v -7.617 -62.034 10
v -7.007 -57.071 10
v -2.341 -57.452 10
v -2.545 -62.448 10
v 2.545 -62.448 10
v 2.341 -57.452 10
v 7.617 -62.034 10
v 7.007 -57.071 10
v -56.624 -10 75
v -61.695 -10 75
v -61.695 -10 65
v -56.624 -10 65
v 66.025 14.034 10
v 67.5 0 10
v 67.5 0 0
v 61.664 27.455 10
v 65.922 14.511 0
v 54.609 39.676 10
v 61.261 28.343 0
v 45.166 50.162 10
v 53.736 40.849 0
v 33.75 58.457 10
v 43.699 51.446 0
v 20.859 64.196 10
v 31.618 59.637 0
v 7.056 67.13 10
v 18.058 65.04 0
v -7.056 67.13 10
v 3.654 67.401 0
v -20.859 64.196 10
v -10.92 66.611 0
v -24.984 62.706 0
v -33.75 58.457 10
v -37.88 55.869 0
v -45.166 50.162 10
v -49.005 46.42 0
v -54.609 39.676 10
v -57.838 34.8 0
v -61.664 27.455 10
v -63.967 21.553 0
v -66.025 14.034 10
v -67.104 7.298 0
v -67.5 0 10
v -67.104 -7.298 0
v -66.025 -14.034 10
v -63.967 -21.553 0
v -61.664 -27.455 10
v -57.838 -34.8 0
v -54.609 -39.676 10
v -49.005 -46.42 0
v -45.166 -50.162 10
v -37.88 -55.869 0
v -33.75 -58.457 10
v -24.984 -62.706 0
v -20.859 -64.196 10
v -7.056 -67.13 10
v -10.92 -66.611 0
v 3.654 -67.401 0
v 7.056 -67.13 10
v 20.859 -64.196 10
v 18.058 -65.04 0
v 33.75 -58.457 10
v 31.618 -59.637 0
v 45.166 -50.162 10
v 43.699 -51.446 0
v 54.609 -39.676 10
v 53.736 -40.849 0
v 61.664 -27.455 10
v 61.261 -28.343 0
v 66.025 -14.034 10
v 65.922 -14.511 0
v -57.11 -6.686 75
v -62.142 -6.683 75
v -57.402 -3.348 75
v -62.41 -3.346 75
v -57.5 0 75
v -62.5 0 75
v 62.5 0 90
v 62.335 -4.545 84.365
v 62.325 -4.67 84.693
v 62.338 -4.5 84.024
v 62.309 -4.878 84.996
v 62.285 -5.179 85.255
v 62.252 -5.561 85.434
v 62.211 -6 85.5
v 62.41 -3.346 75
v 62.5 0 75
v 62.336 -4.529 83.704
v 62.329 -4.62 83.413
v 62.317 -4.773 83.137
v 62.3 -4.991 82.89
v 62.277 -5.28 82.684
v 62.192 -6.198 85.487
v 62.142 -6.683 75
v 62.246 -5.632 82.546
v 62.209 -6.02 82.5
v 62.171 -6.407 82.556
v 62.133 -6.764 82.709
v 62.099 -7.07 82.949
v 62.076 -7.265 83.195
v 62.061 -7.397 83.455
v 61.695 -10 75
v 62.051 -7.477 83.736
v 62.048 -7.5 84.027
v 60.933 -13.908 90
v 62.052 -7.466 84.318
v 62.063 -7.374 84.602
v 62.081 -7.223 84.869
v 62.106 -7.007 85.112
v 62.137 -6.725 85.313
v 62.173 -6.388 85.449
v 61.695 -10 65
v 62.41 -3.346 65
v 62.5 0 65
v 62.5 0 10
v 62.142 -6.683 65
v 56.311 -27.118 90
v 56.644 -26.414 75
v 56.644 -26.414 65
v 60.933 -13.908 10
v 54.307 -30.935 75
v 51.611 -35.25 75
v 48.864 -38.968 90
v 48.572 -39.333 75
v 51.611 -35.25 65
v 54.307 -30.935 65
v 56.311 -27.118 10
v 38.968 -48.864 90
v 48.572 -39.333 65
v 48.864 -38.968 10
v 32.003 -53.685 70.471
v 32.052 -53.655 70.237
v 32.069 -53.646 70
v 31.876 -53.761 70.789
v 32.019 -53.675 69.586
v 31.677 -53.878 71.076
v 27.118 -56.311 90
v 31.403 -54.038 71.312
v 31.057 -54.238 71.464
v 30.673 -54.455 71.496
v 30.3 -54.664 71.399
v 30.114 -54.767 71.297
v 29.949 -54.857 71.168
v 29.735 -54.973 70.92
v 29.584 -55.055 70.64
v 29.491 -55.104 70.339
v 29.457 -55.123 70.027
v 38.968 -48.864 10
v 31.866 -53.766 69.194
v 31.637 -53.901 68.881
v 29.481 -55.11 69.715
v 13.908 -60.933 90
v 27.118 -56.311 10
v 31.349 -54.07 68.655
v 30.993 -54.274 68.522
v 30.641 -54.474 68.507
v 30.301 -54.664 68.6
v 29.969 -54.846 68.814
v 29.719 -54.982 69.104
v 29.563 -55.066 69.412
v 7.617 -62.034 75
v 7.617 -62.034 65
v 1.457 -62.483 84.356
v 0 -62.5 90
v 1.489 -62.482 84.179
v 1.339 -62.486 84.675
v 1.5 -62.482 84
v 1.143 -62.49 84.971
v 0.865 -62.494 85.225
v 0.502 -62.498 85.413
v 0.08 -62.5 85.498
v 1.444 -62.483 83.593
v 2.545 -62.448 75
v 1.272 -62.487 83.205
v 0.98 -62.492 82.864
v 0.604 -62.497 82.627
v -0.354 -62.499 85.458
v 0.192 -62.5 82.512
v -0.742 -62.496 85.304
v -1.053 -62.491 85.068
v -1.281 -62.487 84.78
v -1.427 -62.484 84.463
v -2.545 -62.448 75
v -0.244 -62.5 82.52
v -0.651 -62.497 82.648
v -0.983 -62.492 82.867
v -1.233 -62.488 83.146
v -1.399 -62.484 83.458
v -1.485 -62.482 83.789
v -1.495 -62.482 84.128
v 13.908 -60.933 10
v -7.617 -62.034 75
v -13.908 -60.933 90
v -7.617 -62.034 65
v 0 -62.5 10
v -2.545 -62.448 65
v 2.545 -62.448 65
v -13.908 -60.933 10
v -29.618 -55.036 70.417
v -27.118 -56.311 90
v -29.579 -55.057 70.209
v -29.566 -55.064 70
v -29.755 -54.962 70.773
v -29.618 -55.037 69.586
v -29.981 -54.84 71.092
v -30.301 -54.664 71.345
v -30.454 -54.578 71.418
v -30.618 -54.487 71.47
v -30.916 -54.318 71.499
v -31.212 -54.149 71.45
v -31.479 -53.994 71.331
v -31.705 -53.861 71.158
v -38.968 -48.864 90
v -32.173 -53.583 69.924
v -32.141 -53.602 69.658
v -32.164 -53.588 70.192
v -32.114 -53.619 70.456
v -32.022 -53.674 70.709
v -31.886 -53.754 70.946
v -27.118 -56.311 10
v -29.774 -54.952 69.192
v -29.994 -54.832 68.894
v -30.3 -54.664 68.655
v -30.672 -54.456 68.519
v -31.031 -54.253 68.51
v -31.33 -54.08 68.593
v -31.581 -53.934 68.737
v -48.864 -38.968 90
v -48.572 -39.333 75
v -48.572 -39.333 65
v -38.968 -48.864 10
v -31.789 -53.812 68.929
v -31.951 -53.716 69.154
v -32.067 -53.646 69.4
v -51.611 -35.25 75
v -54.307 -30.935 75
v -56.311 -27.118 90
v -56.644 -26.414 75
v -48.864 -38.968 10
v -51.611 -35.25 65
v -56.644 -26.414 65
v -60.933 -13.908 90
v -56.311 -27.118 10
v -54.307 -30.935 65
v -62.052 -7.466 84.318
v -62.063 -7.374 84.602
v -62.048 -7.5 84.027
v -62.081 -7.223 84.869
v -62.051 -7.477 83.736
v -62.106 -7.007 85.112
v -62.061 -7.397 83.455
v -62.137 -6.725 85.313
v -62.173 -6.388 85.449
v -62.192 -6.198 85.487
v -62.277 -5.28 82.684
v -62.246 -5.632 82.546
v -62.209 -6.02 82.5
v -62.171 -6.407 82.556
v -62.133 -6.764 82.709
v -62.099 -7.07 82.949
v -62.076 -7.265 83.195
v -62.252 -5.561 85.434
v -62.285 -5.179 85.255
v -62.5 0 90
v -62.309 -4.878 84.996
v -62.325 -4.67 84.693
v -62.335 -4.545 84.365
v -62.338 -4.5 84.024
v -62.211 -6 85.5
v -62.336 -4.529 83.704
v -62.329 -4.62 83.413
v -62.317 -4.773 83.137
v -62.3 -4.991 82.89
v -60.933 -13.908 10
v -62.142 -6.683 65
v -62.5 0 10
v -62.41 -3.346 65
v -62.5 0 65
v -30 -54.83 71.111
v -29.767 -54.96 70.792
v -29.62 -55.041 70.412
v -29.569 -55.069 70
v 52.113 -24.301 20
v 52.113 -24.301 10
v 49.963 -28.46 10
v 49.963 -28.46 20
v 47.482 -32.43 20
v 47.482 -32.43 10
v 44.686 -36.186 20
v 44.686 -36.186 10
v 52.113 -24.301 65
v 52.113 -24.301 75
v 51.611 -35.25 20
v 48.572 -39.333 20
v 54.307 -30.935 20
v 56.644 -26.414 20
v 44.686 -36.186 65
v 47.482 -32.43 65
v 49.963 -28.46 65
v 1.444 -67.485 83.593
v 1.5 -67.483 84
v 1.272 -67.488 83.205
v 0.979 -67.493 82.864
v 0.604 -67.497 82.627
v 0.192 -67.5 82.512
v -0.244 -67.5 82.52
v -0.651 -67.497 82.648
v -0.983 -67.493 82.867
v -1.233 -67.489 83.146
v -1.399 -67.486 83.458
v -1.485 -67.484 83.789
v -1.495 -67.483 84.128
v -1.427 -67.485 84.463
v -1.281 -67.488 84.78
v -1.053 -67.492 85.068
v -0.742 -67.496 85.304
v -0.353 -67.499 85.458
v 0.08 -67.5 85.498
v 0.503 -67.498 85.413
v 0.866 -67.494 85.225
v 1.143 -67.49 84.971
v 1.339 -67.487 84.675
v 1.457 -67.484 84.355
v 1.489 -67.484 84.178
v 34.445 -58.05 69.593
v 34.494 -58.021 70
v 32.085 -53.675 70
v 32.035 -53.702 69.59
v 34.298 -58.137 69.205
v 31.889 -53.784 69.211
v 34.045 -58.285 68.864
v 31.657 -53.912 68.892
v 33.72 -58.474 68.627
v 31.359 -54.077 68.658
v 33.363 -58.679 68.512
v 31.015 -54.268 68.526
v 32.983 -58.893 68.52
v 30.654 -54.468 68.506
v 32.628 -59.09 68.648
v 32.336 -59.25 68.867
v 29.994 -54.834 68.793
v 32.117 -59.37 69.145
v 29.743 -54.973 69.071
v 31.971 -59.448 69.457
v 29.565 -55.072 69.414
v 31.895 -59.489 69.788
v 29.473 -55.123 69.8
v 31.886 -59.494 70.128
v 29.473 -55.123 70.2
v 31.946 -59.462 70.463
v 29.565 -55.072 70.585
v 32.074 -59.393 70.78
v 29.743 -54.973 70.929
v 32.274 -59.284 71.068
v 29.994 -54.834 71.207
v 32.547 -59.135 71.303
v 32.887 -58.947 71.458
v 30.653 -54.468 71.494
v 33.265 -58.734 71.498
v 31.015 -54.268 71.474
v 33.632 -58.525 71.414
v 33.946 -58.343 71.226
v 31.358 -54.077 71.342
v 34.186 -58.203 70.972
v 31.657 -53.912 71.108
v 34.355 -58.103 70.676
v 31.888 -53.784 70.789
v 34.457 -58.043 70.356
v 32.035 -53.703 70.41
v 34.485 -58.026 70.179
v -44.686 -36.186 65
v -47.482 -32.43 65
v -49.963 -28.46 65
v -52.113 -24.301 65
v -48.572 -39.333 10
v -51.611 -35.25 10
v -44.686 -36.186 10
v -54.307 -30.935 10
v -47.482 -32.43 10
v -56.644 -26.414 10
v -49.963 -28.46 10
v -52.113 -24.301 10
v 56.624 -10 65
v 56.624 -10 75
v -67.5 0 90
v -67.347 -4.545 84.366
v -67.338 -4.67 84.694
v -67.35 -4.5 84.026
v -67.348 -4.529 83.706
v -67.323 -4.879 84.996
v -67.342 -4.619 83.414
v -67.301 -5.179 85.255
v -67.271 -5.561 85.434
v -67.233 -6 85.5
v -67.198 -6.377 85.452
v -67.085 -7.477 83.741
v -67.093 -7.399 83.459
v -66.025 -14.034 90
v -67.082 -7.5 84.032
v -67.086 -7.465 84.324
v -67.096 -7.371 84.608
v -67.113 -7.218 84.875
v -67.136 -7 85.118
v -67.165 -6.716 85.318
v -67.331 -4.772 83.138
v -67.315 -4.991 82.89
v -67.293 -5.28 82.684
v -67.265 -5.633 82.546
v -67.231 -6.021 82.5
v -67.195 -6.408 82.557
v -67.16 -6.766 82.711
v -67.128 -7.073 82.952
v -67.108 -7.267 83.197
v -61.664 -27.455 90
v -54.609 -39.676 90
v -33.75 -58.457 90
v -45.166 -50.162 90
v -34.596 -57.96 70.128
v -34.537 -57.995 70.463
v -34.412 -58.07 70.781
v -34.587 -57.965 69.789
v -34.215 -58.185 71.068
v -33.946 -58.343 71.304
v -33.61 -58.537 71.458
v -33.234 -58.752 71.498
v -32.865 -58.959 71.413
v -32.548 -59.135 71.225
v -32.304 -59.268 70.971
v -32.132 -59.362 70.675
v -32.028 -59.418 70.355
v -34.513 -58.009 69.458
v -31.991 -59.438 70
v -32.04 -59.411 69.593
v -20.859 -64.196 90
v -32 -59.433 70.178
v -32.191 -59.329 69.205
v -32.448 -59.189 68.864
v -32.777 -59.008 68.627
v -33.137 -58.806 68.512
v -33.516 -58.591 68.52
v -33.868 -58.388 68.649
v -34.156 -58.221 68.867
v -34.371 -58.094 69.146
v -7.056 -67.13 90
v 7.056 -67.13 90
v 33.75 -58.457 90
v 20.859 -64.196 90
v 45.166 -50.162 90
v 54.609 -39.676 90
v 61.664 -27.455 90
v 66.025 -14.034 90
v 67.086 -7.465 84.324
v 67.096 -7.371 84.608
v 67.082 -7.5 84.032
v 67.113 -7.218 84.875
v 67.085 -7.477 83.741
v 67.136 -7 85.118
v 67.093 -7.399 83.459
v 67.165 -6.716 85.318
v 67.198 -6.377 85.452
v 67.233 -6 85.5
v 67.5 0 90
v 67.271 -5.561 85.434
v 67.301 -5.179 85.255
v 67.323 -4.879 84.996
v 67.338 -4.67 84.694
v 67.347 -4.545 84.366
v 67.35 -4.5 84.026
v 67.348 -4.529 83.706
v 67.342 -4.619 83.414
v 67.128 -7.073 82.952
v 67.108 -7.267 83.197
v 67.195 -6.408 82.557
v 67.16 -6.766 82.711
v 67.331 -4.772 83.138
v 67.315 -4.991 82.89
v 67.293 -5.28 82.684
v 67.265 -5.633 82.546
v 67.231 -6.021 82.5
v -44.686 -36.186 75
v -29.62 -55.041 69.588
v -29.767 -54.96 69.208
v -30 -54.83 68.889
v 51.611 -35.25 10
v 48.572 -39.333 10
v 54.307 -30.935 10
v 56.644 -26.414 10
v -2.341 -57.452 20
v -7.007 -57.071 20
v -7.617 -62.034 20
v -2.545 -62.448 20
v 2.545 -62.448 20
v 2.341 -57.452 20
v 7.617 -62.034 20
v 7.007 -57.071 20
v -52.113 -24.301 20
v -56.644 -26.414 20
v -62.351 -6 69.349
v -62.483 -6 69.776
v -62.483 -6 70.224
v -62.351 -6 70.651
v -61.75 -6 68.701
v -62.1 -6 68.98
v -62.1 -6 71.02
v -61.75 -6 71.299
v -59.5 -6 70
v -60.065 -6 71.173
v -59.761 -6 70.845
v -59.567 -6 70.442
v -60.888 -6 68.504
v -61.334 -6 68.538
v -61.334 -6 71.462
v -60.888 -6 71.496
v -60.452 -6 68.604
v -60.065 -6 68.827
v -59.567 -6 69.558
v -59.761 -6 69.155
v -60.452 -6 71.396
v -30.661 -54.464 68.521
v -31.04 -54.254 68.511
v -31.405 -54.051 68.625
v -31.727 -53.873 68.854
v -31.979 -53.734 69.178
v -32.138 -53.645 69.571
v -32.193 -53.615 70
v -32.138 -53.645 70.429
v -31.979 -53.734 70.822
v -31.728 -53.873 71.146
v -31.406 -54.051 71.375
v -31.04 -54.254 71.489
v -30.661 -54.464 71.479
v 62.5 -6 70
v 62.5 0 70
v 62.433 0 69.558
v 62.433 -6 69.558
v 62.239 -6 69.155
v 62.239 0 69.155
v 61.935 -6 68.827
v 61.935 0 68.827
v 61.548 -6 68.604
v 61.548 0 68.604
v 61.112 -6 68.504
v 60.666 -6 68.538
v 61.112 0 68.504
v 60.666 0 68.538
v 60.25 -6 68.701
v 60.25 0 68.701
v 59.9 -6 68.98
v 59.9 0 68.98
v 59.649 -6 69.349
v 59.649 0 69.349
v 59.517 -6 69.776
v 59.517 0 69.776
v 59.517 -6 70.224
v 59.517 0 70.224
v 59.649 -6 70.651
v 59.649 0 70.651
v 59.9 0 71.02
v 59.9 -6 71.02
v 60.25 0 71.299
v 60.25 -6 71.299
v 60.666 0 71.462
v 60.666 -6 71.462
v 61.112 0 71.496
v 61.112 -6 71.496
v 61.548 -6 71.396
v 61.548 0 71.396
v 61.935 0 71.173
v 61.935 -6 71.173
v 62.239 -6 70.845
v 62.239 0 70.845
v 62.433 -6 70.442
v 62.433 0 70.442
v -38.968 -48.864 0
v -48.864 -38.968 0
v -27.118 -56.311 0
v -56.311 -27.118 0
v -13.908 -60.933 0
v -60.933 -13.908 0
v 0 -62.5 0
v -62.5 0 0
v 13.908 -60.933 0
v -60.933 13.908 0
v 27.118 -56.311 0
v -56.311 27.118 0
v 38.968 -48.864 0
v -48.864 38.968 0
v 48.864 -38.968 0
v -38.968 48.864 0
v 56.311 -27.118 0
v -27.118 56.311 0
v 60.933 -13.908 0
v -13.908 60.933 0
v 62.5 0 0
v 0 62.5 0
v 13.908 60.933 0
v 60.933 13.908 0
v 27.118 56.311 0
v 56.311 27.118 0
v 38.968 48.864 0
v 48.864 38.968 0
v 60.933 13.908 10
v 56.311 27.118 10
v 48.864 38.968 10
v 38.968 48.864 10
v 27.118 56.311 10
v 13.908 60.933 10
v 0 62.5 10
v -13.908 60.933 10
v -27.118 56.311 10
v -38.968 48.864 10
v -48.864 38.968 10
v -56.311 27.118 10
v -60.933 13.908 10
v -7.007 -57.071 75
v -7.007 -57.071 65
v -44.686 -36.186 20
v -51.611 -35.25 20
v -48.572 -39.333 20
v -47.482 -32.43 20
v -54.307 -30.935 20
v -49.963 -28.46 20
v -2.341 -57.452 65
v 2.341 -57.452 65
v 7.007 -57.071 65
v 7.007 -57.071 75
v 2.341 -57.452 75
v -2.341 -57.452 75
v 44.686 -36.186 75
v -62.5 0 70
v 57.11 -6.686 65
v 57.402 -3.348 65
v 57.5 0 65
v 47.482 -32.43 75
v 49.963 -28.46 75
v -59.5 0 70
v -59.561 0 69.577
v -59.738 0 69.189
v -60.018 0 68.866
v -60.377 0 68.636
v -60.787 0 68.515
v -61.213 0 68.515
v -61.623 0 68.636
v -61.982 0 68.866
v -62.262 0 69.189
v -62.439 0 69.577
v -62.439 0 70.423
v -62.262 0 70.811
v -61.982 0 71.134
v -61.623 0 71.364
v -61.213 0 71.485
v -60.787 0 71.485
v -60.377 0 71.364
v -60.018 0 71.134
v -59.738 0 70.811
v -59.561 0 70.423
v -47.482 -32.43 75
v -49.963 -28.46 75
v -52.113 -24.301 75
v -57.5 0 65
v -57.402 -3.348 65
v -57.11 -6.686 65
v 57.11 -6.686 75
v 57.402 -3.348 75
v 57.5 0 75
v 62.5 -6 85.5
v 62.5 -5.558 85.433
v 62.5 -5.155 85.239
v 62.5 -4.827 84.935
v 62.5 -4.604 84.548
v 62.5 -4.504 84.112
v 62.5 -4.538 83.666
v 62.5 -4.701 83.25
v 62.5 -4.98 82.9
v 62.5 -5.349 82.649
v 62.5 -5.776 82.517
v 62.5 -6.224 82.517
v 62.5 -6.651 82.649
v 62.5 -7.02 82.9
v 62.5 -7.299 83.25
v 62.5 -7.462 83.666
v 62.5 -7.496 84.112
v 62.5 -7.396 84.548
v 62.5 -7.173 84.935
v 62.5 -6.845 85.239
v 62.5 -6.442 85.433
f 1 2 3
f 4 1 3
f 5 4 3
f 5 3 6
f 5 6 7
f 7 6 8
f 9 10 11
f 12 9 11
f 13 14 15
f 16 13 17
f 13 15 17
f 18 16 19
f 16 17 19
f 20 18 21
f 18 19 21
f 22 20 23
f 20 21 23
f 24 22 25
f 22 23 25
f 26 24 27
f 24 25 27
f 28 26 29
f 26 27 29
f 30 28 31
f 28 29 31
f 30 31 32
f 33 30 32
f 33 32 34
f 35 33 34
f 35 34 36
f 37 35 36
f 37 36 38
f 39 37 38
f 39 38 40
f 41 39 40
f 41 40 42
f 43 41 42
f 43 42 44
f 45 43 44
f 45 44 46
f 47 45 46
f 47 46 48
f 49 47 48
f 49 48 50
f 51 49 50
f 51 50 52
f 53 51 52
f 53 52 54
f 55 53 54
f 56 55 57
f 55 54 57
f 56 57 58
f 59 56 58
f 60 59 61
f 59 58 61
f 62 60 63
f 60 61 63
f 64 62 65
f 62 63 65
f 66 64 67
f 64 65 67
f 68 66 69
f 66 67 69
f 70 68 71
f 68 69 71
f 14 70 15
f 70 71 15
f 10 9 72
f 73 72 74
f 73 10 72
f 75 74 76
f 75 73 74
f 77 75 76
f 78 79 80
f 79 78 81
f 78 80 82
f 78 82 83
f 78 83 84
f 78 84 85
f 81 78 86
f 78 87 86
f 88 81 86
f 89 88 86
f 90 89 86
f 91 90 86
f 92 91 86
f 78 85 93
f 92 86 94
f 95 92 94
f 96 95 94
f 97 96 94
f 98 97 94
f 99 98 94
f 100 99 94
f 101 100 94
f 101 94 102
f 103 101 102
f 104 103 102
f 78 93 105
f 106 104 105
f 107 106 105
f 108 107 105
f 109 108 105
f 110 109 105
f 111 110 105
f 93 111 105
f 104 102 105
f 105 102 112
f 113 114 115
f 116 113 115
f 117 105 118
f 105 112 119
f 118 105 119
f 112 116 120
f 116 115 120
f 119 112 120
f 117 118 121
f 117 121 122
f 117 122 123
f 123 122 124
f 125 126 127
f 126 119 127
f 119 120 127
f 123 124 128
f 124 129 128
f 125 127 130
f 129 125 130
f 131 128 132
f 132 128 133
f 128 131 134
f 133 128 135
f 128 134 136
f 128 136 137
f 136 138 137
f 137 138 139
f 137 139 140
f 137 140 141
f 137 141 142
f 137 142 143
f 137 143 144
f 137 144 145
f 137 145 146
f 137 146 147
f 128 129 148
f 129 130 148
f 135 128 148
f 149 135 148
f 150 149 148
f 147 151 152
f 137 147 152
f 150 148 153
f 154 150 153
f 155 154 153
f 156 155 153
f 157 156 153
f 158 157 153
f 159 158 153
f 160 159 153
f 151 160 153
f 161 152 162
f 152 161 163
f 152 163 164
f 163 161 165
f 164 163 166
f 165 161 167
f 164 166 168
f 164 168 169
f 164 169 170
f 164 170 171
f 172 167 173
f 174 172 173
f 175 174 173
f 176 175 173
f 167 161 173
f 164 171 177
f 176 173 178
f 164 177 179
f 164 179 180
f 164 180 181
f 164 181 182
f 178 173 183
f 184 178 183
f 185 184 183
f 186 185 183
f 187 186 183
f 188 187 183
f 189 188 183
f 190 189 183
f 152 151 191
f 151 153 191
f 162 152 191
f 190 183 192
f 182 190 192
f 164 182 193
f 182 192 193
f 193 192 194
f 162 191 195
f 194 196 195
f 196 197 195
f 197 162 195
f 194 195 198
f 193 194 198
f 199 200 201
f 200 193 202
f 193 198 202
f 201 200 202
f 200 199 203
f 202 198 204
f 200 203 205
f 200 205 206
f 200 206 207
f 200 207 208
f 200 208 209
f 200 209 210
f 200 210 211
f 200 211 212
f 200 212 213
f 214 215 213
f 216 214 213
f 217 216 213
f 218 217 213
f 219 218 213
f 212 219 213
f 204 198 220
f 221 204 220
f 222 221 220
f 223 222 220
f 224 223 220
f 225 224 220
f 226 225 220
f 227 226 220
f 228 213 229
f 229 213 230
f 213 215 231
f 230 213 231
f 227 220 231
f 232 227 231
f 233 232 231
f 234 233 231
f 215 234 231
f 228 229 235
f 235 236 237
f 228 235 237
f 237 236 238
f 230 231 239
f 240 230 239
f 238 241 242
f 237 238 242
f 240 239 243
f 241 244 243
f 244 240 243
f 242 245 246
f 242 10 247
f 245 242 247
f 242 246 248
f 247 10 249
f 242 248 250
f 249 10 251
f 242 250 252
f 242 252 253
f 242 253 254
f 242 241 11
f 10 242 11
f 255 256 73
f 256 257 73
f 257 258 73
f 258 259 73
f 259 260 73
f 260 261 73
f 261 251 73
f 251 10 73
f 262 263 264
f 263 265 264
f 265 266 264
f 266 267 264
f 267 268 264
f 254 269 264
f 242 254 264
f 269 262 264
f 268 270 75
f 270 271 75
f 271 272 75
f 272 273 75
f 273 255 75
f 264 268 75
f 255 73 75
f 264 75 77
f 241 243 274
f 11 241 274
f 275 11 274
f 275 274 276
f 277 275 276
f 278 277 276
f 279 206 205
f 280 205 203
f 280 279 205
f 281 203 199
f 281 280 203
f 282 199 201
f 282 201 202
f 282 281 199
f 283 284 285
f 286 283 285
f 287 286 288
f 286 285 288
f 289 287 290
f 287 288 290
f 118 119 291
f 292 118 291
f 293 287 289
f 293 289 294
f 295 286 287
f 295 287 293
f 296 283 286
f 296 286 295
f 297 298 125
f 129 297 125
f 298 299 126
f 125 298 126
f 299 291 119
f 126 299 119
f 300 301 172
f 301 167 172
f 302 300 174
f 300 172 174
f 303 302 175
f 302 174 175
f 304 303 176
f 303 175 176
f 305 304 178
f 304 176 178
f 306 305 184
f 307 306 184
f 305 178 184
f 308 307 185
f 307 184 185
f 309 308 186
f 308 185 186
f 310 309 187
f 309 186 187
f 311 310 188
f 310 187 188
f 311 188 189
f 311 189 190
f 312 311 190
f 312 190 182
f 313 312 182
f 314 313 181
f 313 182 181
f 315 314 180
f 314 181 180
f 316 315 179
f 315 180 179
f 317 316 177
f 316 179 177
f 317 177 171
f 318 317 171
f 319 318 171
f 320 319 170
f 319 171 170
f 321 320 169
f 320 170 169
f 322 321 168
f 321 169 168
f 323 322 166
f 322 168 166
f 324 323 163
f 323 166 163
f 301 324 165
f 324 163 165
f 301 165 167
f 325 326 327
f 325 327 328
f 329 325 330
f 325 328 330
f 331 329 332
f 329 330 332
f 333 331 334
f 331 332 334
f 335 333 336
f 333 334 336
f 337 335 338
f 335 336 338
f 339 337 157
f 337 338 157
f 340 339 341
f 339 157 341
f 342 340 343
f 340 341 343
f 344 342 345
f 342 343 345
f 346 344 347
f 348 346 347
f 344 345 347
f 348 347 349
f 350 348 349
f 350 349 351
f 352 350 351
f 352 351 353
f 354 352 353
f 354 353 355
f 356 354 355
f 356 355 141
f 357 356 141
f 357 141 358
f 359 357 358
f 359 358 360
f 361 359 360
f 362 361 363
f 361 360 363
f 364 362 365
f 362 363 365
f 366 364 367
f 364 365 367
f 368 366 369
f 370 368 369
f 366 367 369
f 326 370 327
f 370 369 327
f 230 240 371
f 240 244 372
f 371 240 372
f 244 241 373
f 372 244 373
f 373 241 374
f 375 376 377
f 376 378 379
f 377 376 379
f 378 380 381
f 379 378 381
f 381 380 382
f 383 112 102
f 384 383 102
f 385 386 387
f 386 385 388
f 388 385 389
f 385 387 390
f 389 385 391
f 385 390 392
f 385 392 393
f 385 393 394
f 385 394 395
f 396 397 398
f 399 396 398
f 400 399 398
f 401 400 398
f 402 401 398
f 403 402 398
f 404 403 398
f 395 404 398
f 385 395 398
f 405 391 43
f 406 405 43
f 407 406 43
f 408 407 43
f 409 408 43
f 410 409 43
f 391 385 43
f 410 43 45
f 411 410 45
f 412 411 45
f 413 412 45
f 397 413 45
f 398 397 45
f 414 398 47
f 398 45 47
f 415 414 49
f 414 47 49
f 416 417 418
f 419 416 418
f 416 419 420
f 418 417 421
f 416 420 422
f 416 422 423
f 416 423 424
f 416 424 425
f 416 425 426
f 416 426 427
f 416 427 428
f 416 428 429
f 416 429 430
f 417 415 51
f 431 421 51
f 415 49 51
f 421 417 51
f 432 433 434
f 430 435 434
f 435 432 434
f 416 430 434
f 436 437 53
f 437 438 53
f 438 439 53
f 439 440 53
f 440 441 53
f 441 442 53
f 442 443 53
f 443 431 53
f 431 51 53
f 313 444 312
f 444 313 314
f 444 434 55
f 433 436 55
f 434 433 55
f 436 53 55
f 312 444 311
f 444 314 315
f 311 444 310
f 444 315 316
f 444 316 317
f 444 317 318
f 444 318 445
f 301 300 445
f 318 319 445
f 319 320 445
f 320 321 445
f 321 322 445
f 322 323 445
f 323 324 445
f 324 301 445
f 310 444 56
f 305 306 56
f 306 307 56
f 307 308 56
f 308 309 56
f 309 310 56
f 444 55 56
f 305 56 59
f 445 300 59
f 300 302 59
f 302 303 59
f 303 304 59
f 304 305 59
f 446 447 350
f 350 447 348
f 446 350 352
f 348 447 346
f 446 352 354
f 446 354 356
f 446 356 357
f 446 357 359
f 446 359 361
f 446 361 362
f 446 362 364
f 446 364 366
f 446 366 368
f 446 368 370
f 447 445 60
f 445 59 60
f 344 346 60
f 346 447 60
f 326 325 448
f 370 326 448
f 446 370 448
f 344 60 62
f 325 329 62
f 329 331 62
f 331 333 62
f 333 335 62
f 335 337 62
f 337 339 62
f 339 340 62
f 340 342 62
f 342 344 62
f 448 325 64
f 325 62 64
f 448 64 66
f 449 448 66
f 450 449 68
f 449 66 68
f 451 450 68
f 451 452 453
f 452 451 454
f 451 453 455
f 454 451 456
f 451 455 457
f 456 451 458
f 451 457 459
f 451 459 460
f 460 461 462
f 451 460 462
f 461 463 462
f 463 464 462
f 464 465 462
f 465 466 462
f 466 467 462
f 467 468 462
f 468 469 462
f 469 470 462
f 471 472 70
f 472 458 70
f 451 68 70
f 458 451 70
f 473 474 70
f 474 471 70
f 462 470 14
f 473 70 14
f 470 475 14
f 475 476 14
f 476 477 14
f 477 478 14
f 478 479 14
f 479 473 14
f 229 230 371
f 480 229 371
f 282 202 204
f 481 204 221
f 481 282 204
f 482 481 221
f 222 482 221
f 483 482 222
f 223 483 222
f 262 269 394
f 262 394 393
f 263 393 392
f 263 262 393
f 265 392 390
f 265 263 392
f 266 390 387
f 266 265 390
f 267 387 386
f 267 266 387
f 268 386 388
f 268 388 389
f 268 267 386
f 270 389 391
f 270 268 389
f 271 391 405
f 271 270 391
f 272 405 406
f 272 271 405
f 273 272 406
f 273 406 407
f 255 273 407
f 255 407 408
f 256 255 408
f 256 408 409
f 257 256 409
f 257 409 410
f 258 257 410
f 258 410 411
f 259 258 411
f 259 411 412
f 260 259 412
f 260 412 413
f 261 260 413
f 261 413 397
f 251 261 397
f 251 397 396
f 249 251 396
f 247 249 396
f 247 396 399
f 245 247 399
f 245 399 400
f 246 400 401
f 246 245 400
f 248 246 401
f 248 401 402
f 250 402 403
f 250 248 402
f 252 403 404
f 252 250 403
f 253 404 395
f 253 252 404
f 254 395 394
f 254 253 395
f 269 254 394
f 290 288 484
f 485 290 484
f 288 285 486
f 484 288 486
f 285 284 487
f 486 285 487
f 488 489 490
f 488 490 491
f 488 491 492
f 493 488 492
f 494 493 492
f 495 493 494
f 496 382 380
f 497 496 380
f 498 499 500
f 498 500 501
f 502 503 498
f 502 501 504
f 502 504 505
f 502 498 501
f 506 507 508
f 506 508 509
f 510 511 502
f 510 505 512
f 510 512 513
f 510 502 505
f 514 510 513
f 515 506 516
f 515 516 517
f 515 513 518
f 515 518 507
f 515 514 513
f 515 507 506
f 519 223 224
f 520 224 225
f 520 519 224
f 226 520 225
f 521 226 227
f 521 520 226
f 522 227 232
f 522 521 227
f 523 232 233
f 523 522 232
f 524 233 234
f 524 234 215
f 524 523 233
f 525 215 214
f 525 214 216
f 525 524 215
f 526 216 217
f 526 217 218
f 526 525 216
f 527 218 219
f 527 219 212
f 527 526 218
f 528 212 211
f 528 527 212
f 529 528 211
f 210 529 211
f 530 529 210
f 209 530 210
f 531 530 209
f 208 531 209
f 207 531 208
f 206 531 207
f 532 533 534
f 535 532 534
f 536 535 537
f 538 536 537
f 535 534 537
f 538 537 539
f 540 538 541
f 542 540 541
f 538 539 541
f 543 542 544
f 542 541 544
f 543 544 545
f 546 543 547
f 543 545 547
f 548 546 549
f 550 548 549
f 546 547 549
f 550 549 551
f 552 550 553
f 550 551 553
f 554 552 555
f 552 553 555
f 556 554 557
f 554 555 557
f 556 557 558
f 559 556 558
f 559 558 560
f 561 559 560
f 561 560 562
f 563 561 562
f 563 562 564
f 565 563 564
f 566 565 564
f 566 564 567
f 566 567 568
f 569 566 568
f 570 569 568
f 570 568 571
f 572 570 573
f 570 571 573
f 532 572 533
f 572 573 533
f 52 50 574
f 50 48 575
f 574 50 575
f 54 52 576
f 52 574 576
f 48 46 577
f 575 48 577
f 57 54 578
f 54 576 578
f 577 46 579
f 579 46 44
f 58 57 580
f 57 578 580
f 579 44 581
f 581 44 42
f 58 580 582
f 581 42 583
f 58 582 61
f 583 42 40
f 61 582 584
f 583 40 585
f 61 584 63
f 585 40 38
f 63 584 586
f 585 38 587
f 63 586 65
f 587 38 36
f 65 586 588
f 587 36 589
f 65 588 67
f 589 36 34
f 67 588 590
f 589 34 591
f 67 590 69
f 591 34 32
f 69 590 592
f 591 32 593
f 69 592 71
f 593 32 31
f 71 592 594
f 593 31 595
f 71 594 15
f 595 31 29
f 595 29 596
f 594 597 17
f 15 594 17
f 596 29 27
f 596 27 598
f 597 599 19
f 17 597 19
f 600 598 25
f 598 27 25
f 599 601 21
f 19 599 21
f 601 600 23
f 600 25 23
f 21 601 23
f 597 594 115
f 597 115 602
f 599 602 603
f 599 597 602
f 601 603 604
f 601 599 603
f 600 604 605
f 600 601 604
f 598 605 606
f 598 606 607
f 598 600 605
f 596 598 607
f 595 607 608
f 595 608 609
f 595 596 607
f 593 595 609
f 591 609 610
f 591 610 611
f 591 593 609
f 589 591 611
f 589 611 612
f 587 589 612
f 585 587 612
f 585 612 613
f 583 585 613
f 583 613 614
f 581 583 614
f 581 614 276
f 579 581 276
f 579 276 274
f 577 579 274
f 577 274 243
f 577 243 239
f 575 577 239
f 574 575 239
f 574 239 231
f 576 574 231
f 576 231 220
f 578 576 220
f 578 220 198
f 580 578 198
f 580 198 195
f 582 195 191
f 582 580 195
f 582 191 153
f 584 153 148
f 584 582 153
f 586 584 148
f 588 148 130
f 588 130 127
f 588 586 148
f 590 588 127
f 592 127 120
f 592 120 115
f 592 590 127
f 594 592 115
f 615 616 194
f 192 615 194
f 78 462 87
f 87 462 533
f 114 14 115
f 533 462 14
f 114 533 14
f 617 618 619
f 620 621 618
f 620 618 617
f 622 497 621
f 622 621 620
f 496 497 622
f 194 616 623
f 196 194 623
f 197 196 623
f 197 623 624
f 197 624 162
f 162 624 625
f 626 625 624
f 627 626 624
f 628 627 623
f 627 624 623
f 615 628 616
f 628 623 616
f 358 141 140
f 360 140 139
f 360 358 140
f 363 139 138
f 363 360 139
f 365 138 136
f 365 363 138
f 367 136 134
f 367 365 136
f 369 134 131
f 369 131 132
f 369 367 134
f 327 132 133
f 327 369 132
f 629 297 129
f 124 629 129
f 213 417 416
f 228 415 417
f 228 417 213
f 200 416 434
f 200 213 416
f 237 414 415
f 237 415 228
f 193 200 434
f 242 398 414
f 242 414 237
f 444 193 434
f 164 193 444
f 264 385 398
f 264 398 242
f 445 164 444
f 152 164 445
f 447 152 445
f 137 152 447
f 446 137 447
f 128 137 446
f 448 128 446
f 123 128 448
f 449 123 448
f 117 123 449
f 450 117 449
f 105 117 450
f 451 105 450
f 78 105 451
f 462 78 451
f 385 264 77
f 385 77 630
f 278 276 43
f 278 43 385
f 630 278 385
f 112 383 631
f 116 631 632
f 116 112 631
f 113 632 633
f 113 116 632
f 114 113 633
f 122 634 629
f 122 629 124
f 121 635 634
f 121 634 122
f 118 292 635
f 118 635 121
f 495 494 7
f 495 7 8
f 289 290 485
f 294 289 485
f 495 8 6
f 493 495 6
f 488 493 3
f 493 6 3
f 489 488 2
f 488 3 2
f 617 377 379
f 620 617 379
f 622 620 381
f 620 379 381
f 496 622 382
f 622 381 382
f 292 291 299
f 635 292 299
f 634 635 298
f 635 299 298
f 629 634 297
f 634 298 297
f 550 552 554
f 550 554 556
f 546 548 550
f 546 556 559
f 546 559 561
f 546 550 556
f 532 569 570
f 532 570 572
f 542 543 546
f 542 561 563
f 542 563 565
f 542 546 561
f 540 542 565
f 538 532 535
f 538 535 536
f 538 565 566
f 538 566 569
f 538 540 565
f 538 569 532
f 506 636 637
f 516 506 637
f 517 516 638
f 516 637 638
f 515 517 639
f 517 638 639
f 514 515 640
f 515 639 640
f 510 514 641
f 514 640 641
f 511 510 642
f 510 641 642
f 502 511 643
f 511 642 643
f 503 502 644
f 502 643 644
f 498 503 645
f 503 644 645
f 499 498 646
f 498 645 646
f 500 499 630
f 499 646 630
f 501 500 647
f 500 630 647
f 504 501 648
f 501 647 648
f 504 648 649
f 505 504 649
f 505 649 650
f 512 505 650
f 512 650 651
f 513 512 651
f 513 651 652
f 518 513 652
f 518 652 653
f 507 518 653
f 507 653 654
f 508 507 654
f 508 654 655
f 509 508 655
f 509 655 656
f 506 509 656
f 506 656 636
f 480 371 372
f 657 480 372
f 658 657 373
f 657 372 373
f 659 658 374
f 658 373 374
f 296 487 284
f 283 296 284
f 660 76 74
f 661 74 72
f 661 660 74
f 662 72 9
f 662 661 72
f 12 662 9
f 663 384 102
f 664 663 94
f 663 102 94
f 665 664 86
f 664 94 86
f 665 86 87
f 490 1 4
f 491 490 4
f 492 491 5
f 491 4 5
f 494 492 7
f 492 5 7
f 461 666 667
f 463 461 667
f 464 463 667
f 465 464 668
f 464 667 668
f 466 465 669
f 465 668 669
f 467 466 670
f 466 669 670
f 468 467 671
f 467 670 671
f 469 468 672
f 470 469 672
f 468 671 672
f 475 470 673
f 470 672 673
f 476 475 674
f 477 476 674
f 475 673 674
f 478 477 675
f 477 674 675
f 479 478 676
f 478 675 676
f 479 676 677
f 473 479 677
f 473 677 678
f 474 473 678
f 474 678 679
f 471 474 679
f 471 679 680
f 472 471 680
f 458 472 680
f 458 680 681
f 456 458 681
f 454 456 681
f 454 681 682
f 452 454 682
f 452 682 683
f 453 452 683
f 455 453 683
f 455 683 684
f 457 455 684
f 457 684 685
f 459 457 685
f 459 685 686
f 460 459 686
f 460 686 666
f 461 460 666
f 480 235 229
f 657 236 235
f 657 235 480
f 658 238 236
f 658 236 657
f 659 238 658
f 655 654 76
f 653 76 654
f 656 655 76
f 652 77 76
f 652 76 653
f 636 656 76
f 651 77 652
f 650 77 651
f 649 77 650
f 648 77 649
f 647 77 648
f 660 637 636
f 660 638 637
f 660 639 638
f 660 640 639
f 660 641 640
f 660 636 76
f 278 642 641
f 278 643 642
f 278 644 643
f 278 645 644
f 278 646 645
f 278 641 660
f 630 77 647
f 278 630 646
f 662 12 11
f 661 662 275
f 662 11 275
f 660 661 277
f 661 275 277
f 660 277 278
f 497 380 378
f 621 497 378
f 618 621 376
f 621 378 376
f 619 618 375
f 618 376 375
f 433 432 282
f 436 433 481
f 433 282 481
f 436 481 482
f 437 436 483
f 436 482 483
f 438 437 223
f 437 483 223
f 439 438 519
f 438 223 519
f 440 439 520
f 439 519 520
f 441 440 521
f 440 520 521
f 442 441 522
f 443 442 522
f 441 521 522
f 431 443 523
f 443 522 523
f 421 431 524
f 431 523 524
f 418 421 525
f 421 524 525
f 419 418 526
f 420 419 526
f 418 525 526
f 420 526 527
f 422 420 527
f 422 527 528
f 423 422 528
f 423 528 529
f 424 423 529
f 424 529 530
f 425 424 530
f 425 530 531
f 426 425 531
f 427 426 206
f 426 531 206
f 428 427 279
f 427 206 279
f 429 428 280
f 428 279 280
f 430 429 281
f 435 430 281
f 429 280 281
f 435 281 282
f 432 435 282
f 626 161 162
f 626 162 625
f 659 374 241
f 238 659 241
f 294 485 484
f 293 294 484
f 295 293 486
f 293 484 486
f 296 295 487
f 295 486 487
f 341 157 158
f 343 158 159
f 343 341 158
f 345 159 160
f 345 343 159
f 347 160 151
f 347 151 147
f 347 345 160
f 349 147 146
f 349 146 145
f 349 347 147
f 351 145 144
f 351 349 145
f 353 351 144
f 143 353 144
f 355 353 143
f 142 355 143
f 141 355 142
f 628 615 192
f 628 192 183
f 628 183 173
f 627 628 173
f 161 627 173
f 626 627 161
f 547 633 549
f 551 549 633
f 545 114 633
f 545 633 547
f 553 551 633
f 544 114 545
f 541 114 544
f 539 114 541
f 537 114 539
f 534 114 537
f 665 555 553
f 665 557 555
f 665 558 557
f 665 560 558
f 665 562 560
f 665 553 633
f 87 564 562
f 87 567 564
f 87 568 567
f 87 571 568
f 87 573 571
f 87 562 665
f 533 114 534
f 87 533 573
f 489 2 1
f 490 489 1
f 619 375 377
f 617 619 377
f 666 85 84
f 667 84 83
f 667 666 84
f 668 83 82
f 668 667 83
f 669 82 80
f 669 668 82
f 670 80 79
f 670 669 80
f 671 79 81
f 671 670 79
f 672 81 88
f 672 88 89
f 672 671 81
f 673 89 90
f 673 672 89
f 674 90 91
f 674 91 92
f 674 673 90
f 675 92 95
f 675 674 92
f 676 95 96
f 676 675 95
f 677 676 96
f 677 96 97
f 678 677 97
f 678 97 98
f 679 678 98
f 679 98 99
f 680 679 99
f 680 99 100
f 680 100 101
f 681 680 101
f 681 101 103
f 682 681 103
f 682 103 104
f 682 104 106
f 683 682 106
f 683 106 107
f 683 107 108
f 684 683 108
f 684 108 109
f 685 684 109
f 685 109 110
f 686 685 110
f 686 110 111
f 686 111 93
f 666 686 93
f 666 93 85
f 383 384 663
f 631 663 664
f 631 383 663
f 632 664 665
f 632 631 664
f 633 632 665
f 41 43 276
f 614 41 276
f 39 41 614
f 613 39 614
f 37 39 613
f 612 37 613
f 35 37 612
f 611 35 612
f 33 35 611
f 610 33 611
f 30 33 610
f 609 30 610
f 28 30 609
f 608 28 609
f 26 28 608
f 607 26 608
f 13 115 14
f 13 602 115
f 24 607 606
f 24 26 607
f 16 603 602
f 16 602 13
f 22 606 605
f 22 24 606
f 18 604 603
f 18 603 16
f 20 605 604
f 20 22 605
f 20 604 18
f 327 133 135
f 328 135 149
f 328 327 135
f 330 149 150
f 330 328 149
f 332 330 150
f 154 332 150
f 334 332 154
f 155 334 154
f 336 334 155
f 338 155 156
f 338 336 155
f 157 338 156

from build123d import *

# Parameters (mm, degrees)
SKETCH2_R                = 67.5
SKETCH2_R_2              = 62.5
BOSS_EXTRUDE1_DEPTH      = 10
BOSS_EXTRUDE2_DEPTH      = 80
BOSS_EXTRUDE3_DEPTH      = 10
BOSS_EXTRUDE3_2_DEPTH    = 10
BOSS_EXTRUDE3_3_DEPTH    = 10
BOSS_EXTRUDE5_DEPTH      = 10
SKETCH12_W               = 10
SKETCH12_H               = 10
BOSS_EXTRUDE6_DEPTH      = 10
SKETCH14_W               = 10
SKETCH14_H               = 10
BOSS_EXTRUDE7_DEPTH      = 10
SKETCH13_R               = 57.5
CUT_EXTRUDE3_DEPTH       = 26
CUT_EXTRUDE3_DEPTH_BACK  = 66
SKETCH17_R               = 1.5
CUT_EXTRUDE4_DEPTH       = 6
SKETCH19_R               = 1.5
CUT_EXTRUDE5_DEPTH       = 131
CUT_EXTRUDE5_DEPTH_BACK  = 6
SKETCH20_R               = 1.5
CUT_EXTRUDE8_DEPTH       = 22
SKETCH21_R               = 1.5
CUT_EXTRUDE10_DEPTH      = 10
CUT_EXTRUDE10_DEPTH_BACK = 10
SKETCH22_R               = 1.5
CUT_EXTRUDE11_DEPTH      = 10
CUT_EXTRUDE11_DEPTH_BACK = 10


with BuildPart() as part:
    # Sketch2 → Boss-Extrude1 (new body)
    with BuildSketch(Plane.XY):
        Circle(SKETCH2_R)
        Circle(SKETCH2_R_2, mode=Mode.SUBTRACT)
    extrude(amount=BOSS_EXTRUDE1_DEPTH)

    # Sketch3 → Boss-Extrude2 (add)
    with BuildSketch(Plane.XY.offset(10)):
        with BuildLine():
            Line((67.5, 0), (62.5, 0))
            ThreePointArc((62.5, 0), (0, -62.5), (-62.5, 0))
            Line((-62.5, 0), (-67.5, 0))
            ThreePointArc((-67.5, 0), (0, -67.5), (67.5, 0))
        make_face()
    extrude(amount=BOSS_EXTRUDE2_DEPTH)

    # Sketch11 → Boss-Extrude5 (add)
    with BuildSketch(Plane.XY.offset(65)):
        with BuildLine():
            ThreePointArc((48.571622591, -39.332524441), (53.00300601, -33.119954015), (56.64423669, -26.413641359))
            Line((56.64423669, -26.413641359), (52.112697755, -24.30055005))
            ThreePointArc((52.112697755, -24.30055005), (48.762765529, -30.470357693), (44.685892784, -36.185922485))
            Line((44.685892784, -36.185922485), (48.571622591, -39.332524441))
        make_face()
        with BuildLine():
            Line((-7.007487246, -57.071403719), (-7.616833963, -62.034134478))
            ThreePointArc((-7.616833963, -62.034134478), (0, -62.5), (7.616833963, -62.034134478))
            Line((7.616833963, -62.034134478), (7.007487246, -57.071403719))
            ThreePointArc((7.007487246, -57.071403719), (0, -57.5), (-7.007487246, -57.071403719))
        make_face()
        with BuildLine():
            Line((-52.112697755, -24.30055005), (-56.64423669, -26.413641359))
            ThreePointArc((-56.64423669, -26.413641359), (-53.00300601, -33.119954015), (-48.571622591, -39.332524441))
            Line((-48.571622591, -39.332524441), (-44.685892784, -36.185922485))
            ThreePointArc((-44.685892784, -36.185922485), (-48.762765529, -30.470357693), (-52.112697755, -24.30055005))
        make_face()
    extrude(amount=BOSS_EXTRUDE5_DEPTH)

    # Sketch12 → Boss-Extrude6 (add)
    with BuildSketch(Plane.ZY.offset(-62.5)):
        with Locations((70, -5)):
            Rectangle(SKETCH12_W, SKETCH12_H)
    extrude(amount=BOSS_EXTRUDE6_DEPTH)

    # Sketch14 → Boss-Extrude7 (add)
    with BuildSketch(Plane(origin=(-62.5, 0, 0), x_dir=(0, 0, -1), z_dir=(1, 0, 0))):
        with Locations((-70, -5)):
            Rectangle(SKETCH14_W, SKETCH14_H)
    extrude(amount=BOSS_EXTRUDE7_DEPTH)

    # Sketch13 → Cut-Extrude3 (cut, two sides)
    with BuildSketch(Plane.XY.offset(65)) as cut_extrude3_sk:
        Circle(SKETCH13_R)
    extrude(amount=CUT_EXTRUDE3_DEPTH, mode=Mode.SUBTRACT)
    extrude(cut_extrude3_sk.sketch, amount=-CUT_EXTRUDE3_DEPTH_BACK, mode=Mode.SUBTRACT)

    # Sketch17 → Cut-Extrude4 (cut)
    with BuildSketch(Plane(origin=(0, 0, 0), x_dir=(1, 0, 0), z_dir=(0, 1, 0))):
        with Locations((61, -70)):
            Circle(SKETCH17_R)
        with Locations((-61, -70)):
            Circle(SKETCH17_R)
    extrude(amount=-CUT_EXTRUDE4_DEPTH, mode=Mode.SUBTRACT)

    # Sketch19 → Cut-Extrude5 (cut, two sides)
    with BuildSketch(Plane.ZY.offset(-62.5)) as cut_extrude5_sk:
        with Locations((84, -6)):
            Circle(SKETCH19_R)
    extrude(amount=CUT_EXTRUDE5_DEPTH, mode=Mode.SUBTRACT)
    extrude(cut_extrude5_sk.sketch, amount=-CUT_EXTRUDE5_DEPTH_BACK, mode=Mode.SUBTRACT)

    # Sketch20 → Cut-Extrude8 (cut, symmetric)
    with BuildSketch(Plane(origin=(0, -62.5, 0), x_dir=(1, 0, 0), z_dir=(0, 1, 0))):
        with Locations((0, -84)):
            Circle(SKETCH20_R)
    extrude(amount=CUT_EXTRUDE8_DEPTH, both=True, mode=Mode.SUBTRACT)

    # Sketch21 → Cut-Extrude10 (cut, two sides)
    with BuildSketch(Plane(origin=(-30.300601265, -54.663731696, 0), x_dir=(0.874619707, -0.48480962, 0), z_dir=(0.48480962, 0.874619707, 0))) as cut_extrude10_sk:
        with Locations((-0.663731696, -70)):
            Circle(SKETCH21_R)
    extrude(amount=CUT_EXTRUDE10_DEPTH, mode=Mode.SUBTRACT)
    extrude(cut_extrude10_sk.sketch, amount=-CUT_EXTRUDE10_DEPTH_BACK, mode=Mode.SUBTRACT)

    # Sketch22 → Cut-Extrude11 (cut, two sides)
    with BuildSketch(Plane(origin=(30.300601265, -54.663731696, 0), x_dir=(0.874619707, 0.48480962, 0), z_dir=(-0.48480962, 0.874619707, 0))) as cut_extrude11_sk:
        with Locations((0.539879121, -70)):
            Circle(SKETCH22_R)
    extrude(amount=CUT_EXTRUDE11_DEPTH, mode=Mode.SUBTRACT)
    extrude(cut_extrude11_sk.sketch, amount=-CUT_EXTRUDE11_DEPTH_BACK, mode=Mode.SUBTRACT)


with BuildPart() as body_2:
    # Sketch6 → Boss-Extrude3 (new body)
    with BuildSketch(Plane.XY.offset(10)):
        with BuildLine():
            Line((-7.007487246, -57.071403719), (-7.616833963, -62.034134478))
            ThreePointArc((-7.616833963, -62.034134478), (0, -62.5), (7.616833963, -62.034134478))
            Line((7.616833963, -62.034134478), (7.007487246, -57.071403719))
            ThreePointArc((7.007487246, -57.071403719), (0, -57.5), (-7.007487246, -57.071403719))
        make_face()
    extrude(amount=BOSS_EXTRUDE3_DEPTH)


with BuildPart() as body_3:
    # Sketch6 → Boss-Extrude3 2 (new body)
    with BuildSketch(Plane.XY.offset(10)):
        with BuildLine():
            ThreePointArc((48.571622591, -39.332524441), (53.00300601, -33.119954015), (56.64423669, -26.413641359))
            Line((56.64423669, -26.413641359), (52.112697755, -24.30055005))
            ThreePointArc((52.112697755, -24.30055005), (48.762765529, -30.470357693), (44.685892784, -36.185922485))
            Line((44.685892784, -36.185922485), (48.571622591, -39.332524441))
        make_face()
    extrude(amount=BOSS_EXTRUDE3_2_DEPTH)


with BuildPart() as body_4:
    # Sketch6 → Boss-Extrude3 3 (new body)
    with BuildSketch(Plane.XY.offset(10)):
        with BuildLine():
            Line((-52.112697755, -24.30055005), (-56.64423669, -26.413641359))
            ThreePointArc((-56.64423669, -26.413641359), (-53.00300601, -33.119954015), (-48.571622591, -39.332524441))
            Line((-48.571622591, -39.332524441), (-44.685892784, -36.185922485))
            ThreePointArc((-44.685892784, -36.185922485), (-48.762765529, -30.470357693), (-52.112697755, -24.30055005))
        make_face()
    extrude(amount=BOSS_EXTRUDE3_3_DEPTH)


solid = Compound([part.part, body_2.part, body_3.part, body_4.part])
